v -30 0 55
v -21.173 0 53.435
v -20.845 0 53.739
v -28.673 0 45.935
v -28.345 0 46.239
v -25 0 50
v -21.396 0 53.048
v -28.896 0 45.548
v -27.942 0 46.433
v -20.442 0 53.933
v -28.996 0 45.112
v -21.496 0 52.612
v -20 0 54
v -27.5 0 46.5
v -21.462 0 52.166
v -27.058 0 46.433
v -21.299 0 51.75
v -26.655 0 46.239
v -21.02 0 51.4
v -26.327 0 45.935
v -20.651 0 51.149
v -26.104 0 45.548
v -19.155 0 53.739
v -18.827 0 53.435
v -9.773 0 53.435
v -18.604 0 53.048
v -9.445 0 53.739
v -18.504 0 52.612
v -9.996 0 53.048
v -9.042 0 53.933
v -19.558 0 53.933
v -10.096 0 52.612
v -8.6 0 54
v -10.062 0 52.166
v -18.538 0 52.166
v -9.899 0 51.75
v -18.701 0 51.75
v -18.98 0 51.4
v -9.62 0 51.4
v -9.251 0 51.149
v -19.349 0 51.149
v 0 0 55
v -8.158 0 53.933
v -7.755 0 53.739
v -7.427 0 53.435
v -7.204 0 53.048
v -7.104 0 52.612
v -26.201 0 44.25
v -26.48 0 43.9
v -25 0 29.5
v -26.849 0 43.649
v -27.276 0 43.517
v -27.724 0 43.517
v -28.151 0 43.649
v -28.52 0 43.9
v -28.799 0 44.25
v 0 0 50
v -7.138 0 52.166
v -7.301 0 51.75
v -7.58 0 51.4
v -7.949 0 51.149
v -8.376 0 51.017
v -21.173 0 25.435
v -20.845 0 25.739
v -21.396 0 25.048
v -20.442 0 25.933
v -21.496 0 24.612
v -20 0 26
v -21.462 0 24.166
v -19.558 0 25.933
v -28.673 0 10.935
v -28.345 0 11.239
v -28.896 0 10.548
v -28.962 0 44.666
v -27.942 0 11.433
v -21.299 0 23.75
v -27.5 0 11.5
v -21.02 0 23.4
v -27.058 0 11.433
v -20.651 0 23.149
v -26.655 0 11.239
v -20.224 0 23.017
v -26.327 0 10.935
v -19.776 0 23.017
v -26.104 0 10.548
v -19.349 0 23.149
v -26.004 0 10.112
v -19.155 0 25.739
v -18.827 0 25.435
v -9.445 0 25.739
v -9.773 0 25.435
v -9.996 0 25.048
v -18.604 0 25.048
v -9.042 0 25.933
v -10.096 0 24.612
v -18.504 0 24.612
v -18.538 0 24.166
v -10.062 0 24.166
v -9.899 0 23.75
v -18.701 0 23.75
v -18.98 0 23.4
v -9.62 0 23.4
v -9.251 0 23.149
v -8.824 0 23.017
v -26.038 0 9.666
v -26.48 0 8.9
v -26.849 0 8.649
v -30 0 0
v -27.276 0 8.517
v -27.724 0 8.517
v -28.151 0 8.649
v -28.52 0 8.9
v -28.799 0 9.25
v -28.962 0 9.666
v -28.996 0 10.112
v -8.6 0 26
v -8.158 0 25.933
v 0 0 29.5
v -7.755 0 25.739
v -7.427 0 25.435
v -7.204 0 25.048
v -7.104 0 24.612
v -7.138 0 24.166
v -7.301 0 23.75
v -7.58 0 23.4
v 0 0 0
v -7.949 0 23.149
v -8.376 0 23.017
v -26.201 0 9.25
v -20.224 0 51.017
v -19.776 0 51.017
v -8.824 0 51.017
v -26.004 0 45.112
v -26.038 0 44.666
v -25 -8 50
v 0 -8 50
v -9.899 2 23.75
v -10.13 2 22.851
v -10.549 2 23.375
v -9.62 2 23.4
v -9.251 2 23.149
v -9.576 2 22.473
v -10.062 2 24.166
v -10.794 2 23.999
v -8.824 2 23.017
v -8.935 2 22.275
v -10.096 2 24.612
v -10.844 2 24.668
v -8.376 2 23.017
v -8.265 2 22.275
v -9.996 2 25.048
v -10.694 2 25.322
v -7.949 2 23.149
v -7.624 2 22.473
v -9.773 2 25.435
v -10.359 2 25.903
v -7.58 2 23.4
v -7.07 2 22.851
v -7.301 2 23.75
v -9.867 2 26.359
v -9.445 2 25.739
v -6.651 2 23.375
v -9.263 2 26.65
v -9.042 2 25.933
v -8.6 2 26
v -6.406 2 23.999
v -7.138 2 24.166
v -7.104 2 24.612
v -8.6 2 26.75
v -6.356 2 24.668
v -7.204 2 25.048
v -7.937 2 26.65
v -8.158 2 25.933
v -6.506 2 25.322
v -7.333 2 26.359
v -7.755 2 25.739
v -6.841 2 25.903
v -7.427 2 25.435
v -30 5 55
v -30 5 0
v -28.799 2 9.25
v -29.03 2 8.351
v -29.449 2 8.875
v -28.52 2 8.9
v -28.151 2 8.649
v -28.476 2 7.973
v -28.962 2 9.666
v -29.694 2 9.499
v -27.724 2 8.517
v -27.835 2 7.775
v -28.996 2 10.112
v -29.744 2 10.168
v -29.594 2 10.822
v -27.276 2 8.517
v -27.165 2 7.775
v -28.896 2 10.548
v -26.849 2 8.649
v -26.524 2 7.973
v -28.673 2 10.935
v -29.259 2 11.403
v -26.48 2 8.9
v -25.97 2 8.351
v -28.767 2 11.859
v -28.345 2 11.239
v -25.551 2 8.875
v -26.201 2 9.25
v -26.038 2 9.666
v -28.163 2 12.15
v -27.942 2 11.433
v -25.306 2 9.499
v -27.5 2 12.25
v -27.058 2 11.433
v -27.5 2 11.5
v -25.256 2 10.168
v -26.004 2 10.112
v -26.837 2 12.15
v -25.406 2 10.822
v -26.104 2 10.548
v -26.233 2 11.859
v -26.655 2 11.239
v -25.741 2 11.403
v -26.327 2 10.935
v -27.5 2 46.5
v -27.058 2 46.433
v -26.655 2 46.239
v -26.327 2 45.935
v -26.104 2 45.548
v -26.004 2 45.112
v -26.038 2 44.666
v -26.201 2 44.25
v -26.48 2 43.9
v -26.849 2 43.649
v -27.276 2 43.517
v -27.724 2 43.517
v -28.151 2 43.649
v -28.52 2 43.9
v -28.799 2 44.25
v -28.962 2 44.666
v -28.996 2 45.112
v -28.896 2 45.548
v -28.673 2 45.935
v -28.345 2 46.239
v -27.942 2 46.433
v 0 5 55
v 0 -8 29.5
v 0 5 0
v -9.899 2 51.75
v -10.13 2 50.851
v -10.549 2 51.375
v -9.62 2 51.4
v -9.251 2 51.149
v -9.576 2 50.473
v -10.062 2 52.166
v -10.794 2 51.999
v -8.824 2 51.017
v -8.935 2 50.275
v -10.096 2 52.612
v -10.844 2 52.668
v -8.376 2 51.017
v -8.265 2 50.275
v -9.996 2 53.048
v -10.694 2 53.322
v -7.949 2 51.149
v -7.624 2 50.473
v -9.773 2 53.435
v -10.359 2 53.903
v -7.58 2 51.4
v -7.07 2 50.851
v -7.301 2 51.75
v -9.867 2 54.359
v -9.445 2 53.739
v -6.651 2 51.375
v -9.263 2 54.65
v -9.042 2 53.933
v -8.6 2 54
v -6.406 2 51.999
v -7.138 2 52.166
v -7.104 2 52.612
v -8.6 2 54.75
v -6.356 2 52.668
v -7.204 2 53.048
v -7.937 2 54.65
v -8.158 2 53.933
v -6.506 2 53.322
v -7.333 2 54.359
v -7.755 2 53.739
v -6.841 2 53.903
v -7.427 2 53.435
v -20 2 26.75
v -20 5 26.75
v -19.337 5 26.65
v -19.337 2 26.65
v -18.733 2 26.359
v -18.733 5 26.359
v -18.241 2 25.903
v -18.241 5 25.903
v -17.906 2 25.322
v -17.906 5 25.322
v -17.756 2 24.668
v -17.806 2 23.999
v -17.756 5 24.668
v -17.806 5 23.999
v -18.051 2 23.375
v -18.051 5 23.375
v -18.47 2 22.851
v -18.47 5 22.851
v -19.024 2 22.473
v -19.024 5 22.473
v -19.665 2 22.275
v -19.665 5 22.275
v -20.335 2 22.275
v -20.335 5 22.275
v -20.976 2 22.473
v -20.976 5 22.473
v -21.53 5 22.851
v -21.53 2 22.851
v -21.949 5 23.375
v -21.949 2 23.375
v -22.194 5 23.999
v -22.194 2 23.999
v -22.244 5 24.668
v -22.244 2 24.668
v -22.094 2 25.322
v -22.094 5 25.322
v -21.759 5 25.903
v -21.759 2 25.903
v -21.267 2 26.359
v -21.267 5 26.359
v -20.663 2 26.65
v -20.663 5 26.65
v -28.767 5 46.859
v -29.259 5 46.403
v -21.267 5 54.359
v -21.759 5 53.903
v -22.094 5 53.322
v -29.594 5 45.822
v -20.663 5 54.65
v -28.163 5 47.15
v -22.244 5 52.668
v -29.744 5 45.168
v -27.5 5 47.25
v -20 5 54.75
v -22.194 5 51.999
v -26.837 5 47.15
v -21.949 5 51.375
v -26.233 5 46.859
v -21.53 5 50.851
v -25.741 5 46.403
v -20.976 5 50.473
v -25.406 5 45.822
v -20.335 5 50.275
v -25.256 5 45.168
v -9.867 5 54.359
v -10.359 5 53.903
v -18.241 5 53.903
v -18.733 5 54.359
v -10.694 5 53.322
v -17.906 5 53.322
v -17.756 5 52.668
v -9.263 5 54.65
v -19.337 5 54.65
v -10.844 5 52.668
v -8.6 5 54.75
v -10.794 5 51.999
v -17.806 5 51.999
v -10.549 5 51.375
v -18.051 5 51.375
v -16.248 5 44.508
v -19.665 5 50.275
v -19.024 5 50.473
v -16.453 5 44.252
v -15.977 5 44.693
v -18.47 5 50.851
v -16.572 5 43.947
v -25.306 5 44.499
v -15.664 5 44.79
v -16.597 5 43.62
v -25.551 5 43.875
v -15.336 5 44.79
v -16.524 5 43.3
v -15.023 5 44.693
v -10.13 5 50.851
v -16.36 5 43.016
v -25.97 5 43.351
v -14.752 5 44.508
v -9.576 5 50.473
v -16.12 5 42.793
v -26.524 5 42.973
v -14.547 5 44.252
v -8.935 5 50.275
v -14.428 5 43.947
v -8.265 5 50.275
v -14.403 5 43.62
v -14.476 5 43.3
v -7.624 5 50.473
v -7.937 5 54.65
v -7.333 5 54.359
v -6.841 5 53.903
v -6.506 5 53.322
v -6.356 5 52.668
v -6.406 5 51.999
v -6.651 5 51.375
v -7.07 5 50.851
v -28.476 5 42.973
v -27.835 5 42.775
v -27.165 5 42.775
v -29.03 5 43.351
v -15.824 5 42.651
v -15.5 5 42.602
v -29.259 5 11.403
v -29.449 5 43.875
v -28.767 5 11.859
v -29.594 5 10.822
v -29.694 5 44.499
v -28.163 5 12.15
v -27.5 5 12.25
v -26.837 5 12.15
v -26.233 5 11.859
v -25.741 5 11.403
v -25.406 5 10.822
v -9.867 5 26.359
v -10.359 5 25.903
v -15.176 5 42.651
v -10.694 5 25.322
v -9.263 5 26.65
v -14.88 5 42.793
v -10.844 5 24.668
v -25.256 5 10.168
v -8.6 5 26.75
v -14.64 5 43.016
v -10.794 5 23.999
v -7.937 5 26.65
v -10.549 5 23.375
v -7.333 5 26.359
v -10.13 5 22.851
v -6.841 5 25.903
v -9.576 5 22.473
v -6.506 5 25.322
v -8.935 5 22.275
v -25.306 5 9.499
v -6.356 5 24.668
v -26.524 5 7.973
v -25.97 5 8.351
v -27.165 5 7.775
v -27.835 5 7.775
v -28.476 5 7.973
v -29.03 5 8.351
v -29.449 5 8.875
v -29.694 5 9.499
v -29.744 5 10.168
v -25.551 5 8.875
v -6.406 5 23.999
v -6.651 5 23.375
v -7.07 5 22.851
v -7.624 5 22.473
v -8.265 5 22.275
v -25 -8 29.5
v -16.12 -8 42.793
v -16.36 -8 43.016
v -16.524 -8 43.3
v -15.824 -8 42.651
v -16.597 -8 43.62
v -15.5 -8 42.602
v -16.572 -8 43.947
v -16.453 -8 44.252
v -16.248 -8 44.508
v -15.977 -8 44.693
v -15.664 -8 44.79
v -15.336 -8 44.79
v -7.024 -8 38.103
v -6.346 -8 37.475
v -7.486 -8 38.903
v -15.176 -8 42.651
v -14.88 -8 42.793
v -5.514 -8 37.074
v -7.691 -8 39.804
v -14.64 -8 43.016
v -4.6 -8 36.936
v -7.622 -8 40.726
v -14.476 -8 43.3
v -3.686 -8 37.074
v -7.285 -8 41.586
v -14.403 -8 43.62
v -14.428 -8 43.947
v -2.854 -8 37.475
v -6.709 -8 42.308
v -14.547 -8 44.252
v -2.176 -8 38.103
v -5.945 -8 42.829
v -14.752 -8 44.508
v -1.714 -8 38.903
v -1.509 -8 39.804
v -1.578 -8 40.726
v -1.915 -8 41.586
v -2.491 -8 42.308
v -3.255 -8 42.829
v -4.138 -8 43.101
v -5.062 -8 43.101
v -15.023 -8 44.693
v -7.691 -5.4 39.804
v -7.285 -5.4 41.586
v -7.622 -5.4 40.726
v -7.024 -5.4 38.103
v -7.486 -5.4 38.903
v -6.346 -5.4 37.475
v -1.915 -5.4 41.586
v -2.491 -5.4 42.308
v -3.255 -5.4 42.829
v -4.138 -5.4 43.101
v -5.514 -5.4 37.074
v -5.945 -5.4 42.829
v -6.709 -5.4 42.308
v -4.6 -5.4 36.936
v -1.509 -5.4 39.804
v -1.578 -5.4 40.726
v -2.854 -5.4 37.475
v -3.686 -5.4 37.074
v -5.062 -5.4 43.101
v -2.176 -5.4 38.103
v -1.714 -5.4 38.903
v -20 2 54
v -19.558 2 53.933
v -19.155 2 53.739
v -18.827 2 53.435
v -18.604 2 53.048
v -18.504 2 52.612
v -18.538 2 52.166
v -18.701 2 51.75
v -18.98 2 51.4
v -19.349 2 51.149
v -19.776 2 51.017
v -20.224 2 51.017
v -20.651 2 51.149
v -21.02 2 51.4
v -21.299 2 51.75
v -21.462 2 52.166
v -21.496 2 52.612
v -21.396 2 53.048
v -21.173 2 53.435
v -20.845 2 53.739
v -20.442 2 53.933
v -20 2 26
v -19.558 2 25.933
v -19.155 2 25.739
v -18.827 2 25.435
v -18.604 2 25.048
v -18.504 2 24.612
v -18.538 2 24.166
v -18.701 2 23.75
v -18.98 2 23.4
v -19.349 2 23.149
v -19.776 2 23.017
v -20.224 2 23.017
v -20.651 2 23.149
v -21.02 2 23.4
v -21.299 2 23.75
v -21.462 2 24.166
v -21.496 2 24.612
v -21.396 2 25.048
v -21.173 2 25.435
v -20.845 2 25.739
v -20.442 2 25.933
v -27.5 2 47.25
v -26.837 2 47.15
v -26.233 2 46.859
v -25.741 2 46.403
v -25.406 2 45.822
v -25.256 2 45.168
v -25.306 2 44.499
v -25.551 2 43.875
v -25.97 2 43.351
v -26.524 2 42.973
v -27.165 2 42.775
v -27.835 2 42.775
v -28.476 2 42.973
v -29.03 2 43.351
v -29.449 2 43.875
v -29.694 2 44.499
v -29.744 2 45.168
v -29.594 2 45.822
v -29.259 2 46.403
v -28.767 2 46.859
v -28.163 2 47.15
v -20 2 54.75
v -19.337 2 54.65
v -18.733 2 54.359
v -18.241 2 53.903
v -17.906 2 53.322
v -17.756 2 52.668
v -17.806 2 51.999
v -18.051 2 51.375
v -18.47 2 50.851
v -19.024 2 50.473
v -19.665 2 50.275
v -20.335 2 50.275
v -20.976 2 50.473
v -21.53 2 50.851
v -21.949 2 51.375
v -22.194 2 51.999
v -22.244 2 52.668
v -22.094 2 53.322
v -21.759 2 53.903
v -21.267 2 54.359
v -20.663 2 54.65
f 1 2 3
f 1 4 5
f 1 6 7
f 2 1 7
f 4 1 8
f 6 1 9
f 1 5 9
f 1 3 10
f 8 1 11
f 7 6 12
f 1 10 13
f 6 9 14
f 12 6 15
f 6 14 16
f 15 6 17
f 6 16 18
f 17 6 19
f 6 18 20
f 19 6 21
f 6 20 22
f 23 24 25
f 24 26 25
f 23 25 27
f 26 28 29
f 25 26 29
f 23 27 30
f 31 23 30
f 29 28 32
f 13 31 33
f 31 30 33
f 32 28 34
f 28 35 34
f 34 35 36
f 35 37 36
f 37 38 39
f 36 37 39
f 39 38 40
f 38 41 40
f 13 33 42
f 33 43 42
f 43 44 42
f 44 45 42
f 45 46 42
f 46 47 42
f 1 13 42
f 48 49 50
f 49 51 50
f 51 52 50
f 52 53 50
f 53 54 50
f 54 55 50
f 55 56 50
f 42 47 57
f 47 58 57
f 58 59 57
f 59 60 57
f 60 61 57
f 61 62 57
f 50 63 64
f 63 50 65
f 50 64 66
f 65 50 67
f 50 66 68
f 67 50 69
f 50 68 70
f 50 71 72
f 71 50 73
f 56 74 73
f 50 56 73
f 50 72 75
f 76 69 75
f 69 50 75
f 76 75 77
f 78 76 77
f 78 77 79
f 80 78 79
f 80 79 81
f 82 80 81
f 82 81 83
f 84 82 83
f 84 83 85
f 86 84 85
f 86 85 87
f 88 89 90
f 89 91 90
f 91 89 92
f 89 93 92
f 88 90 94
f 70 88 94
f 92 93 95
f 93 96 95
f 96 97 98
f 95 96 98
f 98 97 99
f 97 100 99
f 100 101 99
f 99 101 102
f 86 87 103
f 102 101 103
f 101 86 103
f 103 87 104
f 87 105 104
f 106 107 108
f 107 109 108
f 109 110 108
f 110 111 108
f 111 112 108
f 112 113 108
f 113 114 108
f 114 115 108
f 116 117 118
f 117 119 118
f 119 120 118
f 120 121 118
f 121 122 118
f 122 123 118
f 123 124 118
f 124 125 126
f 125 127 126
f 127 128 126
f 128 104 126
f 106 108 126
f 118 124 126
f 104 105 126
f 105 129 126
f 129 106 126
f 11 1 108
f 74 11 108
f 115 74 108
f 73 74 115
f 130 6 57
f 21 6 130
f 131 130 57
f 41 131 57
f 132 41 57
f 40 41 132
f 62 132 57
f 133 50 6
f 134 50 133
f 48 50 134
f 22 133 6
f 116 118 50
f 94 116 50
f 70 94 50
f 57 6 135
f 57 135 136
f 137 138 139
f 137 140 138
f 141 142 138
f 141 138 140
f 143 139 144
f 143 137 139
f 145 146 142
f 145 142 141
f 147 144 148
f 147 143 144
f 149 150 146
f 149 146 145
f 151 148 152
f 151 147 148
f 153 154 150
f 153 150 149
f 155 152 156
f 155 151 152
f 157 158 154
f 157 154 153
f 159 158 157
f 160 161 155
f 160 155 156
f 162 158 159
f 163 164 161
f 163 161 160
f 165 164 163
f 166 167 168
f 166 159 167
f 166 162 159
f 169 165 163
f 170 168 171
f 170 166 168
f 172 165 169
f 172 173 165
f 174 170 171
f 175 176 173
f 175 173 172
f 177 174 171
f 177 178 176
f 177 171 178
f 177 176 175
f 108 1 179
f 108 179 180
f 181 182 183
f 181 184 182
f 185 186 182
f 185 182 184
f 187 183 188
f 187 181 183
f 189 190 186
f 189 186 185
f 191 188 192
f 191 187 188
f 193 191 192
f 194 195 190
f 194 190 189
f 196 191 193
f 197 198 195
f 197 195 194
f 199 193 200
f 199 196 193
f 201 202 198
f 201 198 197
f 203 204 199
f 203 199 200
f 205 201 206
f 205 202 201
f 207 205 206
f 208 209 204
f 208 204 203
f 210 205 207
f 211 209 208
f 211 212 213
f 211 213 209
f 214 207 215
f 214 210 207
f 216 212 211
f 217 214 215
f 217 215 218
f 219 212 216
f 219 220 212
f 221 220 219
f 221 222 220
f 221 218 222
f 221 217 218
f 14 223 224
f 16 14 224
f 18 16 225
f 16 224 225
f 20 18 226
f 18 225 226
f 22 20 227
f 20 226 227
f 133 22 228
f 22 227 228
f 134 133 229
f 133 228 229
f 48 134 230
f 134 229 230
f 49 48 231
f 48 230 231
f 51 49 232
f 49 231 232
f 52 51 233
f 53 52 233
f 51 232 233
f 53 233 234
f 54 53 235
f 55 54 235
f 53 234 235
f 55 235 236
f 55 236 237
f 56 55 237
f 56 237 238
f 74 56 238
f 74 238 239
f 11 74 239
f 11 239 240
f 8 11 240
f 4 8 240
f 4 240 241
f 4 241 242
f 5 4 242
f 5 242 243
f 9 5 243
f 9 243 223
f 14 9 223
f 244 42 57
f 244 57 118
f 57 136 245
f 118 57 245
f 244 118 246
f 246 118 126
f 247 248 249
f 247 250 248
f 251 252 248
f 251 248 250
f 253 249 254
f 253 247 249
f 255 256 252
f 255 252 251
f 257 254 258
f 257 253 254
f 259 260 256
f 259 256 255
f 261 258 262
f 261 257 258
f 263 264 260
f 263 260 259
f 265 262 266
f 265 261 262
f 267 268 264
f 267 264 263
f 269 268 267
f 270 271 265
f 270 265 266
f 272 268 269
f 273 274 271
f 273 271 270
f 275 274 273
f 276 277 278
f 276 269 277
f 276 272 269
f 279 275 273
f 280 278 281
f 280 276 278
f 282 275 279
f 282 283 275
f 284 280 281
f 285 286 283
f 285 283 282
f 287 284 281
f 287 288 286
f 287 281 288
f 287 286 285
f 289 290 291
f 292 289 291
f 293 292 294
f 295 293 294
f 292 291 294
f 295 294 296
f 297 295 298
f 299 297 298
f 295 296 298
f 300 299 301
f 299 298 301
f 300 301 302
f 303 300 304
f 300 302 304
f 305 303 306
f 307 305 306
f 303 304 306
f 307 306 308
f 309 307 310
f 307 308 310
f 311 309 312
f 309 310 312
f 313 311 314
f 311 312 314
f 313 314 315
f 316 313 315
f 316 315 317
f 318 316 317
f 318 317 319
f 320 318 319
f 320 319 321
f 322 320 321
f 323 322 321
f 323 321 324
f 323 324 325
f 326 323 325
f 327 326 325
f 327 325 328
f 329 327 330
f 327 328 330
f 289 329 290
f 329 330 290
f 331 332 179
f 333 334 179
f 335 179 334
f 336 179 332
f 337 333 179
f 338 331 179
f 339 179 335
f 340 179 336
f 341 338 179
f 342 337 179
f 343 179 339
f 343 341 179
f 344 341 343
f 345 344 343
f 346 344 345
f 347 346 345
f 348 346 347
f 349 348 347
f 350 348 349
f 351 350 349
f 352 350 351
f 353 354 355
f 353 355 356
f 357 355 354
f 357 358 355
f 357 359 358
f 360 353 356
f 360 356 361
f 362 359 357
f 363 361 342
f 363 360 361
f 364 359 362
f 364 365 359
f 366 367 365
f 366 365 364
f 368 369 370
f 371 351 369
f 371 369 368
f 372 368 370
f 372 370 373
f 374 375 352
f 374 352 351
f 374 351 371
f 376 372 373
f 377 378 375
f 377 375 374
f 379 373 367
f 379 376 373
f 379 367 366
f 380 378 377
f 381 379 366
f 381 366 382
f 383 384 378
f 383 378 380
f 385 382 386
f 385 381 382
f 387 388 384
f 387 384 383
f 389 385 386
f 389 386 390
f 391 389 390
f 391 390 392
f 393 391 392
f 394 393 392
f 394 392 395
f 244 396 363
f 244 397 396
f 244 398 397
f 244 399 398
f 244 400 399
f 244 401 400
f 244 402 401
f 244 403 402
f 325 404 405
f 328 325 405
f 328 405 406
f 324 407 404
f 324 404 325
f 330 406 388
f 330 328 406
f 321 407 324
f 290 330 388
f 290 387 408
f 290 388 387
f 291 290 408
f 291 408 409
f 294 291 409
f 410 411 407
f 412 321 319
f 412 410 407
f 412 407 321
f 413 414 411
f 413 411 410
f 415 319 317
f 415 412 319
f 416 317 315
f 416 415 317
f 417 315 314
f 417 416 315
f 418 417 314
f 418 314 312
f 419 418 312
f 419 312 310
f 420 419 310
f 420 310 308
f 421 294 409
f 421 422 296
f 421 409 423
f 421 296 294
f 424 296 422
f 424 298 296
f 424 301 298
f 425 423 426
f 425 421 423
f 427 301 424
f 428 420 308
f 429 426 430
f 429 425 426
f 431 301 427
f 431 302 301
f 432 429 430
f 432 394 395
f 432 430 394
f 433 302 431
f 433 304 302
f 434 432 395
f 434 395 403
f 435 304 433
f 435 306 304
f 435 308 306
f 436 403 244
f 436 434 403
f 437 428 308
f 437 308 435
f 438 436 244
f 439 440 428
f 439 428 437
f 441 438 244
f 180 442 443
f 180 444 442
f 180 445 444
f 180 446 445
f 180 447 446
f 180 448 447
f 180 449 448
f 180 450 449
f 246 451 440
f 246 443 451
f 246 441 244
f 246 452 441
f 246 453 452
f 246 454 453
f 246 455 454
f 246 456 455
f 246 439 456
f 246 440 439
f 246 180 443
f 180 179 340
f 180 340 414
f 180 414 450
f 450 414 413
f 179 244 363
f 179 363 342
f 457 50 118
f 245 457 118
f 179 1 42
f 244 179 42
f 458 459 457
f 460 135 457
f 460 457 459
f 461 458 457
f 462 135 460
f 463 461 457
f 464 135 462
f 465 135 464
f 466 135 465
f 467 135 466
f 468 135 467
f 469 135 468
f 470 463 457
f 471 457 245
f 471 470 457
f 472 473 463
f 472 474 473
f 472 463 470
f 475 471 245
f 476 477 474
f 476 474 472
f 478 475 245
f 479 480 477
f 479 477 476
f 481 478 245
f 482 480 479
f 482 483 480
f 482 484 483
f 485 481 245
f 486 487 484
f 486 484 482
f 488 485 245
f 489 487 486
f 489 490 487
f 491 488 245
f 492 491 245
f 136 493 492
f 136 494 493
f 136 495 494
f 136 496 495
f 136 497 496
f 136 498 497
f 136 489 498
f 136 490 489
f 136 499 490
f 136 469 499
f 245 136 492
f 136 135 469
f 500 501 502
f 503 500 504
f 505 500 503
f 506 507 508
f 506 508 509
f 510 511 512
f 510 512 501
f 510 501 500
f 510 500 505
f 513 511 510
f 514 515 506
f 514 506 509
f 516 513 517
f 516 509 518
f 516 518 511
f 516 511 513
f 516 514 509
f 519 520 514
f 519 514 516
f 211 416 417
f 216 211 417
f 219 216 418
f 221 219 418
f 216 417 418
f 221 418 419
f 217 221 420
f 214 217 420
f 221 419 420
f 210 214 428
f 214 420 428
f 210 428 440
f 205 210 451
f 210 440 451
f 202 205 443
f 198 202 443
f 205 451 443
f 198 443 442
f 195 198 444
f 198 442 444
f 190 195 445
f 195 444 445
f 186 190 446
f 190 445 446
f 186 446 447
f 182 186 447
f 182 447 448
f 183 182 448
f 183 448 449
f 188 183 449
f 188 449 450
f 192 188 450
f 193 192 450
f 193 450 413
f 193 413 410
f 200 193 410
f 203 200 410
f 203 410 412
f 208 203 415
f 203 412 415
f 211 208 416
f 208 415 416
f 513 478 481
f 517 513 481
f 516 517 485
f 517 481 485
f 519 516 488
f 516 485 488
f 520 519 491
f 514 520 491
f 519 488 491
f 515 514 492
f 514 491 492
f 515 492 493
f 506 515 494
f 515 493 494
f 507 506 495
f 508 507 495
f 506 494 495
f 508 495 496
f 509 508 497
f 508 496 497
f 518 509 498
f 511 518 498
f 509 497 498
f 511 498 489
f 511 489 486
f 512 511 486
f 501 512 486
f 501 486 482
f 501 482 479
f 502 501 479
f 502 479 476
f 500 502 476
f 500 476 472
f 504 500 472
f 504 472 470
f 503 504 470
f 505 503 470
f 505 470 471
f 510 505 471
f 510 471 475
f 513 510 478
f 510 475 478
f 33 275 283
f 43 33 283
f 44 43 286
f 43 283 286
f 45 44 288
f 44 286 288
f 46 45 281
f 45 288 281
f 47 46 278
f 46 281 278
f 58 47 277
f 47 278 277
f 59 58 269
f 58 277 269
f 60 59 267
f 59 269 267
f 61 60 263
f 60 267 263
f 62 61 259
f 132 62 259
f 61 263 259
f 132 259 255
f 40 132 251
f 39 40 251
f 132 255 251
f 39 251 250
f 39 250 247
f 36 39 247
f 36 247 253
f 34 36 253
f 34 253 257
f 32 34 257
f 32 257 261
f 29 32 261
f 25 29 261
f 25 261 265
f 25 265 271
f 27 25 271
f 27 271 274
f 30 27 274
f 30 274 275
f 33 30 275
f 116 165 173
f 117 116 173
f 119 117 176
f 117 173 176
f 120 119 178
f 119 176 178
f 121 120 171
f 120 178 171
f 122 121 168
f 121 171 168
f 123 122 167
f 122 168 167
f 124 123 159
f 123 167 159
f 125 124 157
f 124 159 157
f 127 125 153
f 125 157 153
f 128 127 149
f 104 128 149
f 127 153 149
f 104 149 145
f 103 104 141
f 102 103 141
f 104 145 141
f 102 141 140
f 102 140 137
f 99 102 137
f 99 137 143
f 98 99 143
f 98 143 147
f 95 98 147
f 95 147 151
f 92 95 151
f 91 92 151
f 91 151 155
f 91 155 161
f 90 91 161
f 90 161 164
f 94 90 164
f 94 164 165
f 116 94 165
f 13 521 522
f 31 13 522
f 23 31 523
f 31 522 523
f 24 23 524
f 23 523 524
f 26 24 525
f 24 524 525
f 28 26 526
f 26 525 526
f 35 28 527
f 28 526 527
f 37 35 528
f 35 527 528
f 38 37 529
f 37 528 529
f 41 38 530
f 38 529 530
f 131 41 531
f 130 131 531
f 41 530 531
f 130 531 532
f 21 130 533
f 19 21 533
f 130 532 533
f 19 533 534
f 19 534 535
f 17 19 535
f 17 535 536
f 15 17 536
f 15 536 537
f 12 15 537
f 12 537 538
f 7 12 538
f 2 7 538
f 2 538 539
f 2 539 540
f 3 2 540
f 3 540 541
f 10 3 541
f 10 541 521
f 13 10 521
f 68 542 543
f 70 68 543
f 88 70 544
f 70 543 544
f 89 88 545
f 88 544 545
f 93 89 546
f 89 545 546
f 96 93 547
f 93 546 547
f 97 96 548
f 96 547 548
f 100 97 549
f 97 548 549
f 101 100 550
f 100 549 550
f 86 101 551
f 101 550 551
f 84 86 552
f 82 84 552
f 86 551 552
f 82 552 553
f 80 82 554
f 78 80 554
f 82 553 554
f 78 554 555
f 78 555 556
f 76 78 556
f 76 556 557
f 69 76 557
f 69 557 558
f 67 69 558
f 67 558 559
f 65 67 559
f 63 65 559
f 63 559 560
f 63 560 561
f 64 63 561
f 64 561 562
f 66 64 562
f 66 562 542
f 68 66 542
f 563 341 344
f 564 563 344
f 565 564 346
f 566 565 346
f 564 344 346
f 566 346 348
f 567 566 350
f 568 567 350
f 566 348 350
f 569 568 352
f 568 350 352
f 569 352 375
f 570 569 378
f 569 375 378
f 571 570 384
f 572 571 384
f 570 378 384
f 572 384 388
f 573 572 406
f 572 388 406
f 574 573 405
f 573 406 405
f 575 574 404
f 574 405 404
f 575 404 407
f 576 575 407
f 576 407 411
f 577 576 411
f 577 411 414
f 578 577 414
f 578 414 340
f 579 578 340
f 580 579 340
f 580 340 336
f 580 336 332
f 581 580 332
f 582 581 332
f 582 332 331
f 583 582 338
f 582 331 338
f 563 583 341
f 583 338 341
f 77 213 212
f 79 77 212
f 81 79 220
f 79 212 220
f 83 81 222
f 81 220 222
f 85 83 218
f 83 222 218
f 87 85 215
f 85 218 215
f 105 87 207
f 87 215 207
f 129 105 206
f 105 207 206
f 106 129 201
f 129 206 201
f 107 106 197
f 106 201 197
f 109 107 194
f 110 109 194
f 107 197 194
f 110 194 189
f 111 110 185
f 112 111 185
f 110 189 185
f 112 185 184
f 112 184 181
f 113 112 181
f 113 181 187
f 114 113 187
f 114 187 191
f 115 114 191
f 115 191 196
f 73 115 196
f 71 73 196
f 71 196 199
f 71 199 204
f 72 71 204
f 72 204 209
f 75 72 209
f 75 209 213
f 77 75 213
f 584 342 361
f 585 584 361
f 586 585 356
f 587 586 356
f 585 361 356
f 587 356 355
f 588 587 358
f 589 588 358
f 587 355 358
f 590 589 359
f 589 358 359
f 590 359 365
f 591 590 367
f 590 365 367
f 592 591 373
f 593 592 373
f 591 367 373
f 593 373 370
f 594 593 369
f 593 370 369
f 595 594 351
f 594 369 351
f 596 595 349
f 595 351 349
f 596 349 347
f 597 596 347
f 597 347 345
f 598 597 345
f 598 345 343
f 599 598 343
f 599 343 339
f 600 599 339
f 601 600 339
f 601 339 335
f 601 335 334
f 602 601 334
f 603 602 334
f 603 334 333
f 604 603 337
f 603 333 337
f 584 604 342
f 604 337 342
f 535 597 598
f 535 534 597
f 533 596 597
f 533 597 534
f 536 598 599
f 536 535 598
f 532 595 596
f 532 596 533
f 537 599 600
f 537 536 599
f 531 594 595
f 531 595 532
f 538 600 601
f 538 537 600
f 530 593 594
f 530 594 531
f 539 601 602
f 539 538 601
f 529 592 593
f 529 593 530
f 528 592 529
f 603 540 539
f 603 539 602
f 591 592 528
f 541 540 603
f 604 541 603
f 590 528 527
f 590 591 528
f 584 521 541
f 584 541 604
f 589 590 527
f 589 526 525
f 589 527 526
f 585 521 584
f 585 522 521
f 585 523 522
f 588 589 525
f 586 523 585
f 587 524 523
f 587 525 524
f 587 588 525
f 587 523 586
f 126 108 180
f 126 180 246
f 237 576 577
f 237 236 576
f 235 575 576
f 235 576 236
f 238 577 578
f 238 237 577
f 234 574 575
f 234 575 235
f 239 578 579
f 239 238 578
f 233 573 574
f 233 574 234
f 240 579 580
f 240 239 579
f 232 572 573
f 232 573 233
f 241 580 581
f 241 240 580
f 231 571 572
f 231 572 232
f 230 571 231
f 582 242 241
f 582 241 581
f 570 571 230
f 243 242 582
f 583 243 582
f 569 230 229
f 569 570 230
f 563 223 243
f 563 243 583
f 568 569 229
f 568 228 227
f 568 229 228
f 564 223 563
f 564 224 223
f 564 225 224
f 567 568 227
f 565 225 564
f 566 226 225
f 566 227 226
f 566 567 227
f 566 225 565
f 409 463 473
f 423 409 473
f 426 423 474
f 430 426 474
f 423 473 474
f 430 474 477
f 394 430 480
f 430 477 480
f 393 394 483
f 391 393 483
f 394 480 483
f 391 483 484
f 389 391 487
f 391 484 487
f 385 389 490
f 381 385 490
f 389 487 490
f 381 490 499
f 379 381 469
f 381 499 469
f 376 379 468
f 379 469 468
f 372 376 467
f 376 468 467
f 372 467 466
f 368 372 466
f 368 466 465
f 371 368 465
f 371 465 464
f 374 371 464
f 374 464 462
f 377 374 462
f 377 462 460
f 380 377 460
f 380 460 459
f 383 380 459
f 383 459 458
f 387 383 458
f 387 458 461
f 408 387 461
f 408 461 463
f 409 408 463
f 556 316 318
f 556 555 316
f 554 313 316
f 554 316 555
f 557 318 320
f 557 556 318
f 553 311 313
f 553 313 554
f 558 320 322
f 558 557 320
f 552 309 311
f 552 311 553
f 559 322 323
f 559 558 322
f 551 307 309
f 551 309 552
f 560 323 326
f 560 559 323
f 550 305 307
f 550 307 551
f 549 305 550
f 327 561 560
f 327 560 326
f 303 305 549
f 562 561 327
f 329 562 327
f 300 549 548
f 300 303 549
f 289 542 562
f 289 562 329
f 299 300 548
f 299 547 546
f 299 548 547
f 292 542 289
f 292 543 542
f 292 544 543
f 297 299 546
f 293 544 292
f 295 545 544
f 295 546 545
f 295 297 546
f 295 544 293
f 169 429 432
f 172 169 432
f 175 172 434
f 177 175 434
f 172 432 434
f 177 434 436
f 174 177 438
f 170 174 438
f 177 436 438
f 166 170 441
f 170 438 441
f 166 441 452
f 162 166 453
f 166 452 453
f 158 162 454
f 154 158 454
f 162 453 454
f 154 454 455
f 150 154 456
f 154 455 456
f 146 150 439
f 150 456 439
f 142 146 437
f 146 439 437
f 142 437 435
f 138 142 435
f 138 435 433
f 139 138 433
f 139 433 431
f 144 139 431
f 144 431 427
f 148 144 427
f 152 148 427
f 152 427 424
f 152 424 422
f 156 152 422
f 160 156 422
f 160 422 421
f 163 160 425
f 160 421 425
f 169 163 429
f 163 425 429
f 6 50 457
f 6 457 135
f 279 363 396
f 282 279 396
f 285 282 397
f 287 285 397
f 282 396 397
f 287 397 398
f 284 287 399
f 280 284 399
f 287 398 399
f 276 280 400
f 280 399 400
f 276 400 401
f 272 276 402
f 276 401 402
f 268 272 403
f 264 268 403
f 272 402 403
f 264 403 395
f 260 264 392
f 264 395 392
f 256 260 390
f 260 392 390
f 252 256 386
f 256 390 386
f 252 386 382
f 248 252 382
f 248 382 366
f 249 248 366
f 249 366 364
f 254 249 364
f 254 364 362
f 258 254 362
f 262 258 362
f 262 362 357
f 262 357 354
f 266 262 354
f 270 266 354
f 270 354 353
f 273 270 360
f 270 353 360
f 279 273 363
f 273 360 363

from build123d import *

# Parameters (mm, degrees)
SKETCH_1_W          = 30
SKETCH_1_H          = 55
EXTRUDE_1_DEPTH     = 5
SKETCH_4_R          = 1.5
CUT_EXTRUDE_1_DEPTH = 63.84902545
SKETCH_4_3_R        = 2.25
CUT_EXTRUDE_2_DEPTH = 3
SKETCH_5_W          = 25
SKETCH_5_H          = 20.5
EXTRUDE_2_DEPTH     = 8
SKETCH_6_R          = 3.1
CUT_EXTRUDE_3_DEPTH = 2.6
SKETCH_6_3_R        = 1.1
CUT_EXTRUDE_4_DEPTH = 64.984373092


with BuildPart() as part:
    # 草图1 → 凸台-拉伸1 (new body)
    with BuildSketch(Plane(origin=(0, 0, 0), x_dir=(1, 0, 0), z_dir=(0, 1, 0))):
        with Locations((-15, -27.5)):
            Rectangle(SKETCH_1_W, SKETCH_1_H)
    extrude(amount=EXTRUDE_1_DEPTH)

    # 草图4 → 切除-拉伸1 (cut, through all)
    with BuildSketch(Plane(origin=(0, 5, 0), x_dir=(1, 0, 0), z_dir=(0, 1, 0))):
        with Locations(Location((-27.5, -10, 0), (0, 0, 270))):
            Circle(SKETCH_4_R)
        with Locations(Location((-27.5, -45, 0), (0, 0, 270))):
            Circle(SKETCH_4_R)
        with Locations(Location((-20, -52.5, 0), (0, 0, 270))):
            Circle(SKETCH_4_R)
        with Locations(Location((-8.6, -52.5, 0), (0, 0, 270))):
            Circle(SKETCH_4_R)
        with Locations(Location((-8.6, -24.5, 0), (0, 0, 270))):
            Circle(SKETCH_4_R)
        with Locations(Location((-20, -24.5, 0), (0, 0, 270))):
            Circle(SKETCH_4_R)
    extrude(amount=-CUT_EXTRUDE_1_DEPTH, mode=Mode.SUBTRACT)

    # 草图4<3> → 切除-拉伸2 (cut)
    with BuildSketch(Plane(origin=(0, 5, 0), x_dir=(1, 0, 0), z_dir=(0, 1, 0))):
        with Locations(Location((-27.5, -10, 0), (0, 0, 270))):
            Circle(SKETCH_4_3_R)
        with Locations(Location((-27.5, -45, 0), (0, 0, 270))):
            Circle(SKETCH_4_3_R)
        with Locations(Location((-20, -52.5, 0), (0, 0, 270))):
            Circle(SKETCH_4_3_R)
        with Locations(Location((-8.6, -52.5, 0), (0, 0, 270))):
            Circle(SKETCH_4_3_R)
        with Locations(Location((-8.6, -24.5, 0), (0, 0, 270))):
            Circle(SKETCH_4_3_R)
        with Locations(Location((-20, -24.5, 0), (0, 0, 270))):
            Circle(SKETCH_4_3_R)
    extrude(amount=-CUT_EXTRUDE_2_DEPTH, mode=Mode.SUBTRACT)

    # 草图5 → 凸台-拉伸2 (add)
    with BuildSketch(Plane.XZ):
        with Locations((-12.5, 39.75)):
            Rectangle(SKETCH_5_W, SKETCH_5_H)
    extrude(amount=EXTRUDE_2_DEPTH)

    # 草图6 → 切除-拉伸3 (cut)
    with BuildSketch(Plane.XZ.offset(8)):
        with Locations(Location((-4.6, 40.035904331, 0), (0, 0, 270))):
            Circle(SKETCH_6_R)
    extrude(amount=-CUT_EXTRUDE_3_DEPTH, mode=Mode.SUBTRACT)

    # 草图6<3> → 切除-拉伸4 (cut, through all)
    with BuildSketch(Plane.XZ.offset(8)):
        with Locations(Location((-15.5, 43.701964887, 0), (0, 0, 270))):
            Circle(SKETCH_6_3_R)
    extrude(amount=-CUT_EXTRUDE_4_DEPTH, mode=Mode.SUBTRACT)


solid = part.part
